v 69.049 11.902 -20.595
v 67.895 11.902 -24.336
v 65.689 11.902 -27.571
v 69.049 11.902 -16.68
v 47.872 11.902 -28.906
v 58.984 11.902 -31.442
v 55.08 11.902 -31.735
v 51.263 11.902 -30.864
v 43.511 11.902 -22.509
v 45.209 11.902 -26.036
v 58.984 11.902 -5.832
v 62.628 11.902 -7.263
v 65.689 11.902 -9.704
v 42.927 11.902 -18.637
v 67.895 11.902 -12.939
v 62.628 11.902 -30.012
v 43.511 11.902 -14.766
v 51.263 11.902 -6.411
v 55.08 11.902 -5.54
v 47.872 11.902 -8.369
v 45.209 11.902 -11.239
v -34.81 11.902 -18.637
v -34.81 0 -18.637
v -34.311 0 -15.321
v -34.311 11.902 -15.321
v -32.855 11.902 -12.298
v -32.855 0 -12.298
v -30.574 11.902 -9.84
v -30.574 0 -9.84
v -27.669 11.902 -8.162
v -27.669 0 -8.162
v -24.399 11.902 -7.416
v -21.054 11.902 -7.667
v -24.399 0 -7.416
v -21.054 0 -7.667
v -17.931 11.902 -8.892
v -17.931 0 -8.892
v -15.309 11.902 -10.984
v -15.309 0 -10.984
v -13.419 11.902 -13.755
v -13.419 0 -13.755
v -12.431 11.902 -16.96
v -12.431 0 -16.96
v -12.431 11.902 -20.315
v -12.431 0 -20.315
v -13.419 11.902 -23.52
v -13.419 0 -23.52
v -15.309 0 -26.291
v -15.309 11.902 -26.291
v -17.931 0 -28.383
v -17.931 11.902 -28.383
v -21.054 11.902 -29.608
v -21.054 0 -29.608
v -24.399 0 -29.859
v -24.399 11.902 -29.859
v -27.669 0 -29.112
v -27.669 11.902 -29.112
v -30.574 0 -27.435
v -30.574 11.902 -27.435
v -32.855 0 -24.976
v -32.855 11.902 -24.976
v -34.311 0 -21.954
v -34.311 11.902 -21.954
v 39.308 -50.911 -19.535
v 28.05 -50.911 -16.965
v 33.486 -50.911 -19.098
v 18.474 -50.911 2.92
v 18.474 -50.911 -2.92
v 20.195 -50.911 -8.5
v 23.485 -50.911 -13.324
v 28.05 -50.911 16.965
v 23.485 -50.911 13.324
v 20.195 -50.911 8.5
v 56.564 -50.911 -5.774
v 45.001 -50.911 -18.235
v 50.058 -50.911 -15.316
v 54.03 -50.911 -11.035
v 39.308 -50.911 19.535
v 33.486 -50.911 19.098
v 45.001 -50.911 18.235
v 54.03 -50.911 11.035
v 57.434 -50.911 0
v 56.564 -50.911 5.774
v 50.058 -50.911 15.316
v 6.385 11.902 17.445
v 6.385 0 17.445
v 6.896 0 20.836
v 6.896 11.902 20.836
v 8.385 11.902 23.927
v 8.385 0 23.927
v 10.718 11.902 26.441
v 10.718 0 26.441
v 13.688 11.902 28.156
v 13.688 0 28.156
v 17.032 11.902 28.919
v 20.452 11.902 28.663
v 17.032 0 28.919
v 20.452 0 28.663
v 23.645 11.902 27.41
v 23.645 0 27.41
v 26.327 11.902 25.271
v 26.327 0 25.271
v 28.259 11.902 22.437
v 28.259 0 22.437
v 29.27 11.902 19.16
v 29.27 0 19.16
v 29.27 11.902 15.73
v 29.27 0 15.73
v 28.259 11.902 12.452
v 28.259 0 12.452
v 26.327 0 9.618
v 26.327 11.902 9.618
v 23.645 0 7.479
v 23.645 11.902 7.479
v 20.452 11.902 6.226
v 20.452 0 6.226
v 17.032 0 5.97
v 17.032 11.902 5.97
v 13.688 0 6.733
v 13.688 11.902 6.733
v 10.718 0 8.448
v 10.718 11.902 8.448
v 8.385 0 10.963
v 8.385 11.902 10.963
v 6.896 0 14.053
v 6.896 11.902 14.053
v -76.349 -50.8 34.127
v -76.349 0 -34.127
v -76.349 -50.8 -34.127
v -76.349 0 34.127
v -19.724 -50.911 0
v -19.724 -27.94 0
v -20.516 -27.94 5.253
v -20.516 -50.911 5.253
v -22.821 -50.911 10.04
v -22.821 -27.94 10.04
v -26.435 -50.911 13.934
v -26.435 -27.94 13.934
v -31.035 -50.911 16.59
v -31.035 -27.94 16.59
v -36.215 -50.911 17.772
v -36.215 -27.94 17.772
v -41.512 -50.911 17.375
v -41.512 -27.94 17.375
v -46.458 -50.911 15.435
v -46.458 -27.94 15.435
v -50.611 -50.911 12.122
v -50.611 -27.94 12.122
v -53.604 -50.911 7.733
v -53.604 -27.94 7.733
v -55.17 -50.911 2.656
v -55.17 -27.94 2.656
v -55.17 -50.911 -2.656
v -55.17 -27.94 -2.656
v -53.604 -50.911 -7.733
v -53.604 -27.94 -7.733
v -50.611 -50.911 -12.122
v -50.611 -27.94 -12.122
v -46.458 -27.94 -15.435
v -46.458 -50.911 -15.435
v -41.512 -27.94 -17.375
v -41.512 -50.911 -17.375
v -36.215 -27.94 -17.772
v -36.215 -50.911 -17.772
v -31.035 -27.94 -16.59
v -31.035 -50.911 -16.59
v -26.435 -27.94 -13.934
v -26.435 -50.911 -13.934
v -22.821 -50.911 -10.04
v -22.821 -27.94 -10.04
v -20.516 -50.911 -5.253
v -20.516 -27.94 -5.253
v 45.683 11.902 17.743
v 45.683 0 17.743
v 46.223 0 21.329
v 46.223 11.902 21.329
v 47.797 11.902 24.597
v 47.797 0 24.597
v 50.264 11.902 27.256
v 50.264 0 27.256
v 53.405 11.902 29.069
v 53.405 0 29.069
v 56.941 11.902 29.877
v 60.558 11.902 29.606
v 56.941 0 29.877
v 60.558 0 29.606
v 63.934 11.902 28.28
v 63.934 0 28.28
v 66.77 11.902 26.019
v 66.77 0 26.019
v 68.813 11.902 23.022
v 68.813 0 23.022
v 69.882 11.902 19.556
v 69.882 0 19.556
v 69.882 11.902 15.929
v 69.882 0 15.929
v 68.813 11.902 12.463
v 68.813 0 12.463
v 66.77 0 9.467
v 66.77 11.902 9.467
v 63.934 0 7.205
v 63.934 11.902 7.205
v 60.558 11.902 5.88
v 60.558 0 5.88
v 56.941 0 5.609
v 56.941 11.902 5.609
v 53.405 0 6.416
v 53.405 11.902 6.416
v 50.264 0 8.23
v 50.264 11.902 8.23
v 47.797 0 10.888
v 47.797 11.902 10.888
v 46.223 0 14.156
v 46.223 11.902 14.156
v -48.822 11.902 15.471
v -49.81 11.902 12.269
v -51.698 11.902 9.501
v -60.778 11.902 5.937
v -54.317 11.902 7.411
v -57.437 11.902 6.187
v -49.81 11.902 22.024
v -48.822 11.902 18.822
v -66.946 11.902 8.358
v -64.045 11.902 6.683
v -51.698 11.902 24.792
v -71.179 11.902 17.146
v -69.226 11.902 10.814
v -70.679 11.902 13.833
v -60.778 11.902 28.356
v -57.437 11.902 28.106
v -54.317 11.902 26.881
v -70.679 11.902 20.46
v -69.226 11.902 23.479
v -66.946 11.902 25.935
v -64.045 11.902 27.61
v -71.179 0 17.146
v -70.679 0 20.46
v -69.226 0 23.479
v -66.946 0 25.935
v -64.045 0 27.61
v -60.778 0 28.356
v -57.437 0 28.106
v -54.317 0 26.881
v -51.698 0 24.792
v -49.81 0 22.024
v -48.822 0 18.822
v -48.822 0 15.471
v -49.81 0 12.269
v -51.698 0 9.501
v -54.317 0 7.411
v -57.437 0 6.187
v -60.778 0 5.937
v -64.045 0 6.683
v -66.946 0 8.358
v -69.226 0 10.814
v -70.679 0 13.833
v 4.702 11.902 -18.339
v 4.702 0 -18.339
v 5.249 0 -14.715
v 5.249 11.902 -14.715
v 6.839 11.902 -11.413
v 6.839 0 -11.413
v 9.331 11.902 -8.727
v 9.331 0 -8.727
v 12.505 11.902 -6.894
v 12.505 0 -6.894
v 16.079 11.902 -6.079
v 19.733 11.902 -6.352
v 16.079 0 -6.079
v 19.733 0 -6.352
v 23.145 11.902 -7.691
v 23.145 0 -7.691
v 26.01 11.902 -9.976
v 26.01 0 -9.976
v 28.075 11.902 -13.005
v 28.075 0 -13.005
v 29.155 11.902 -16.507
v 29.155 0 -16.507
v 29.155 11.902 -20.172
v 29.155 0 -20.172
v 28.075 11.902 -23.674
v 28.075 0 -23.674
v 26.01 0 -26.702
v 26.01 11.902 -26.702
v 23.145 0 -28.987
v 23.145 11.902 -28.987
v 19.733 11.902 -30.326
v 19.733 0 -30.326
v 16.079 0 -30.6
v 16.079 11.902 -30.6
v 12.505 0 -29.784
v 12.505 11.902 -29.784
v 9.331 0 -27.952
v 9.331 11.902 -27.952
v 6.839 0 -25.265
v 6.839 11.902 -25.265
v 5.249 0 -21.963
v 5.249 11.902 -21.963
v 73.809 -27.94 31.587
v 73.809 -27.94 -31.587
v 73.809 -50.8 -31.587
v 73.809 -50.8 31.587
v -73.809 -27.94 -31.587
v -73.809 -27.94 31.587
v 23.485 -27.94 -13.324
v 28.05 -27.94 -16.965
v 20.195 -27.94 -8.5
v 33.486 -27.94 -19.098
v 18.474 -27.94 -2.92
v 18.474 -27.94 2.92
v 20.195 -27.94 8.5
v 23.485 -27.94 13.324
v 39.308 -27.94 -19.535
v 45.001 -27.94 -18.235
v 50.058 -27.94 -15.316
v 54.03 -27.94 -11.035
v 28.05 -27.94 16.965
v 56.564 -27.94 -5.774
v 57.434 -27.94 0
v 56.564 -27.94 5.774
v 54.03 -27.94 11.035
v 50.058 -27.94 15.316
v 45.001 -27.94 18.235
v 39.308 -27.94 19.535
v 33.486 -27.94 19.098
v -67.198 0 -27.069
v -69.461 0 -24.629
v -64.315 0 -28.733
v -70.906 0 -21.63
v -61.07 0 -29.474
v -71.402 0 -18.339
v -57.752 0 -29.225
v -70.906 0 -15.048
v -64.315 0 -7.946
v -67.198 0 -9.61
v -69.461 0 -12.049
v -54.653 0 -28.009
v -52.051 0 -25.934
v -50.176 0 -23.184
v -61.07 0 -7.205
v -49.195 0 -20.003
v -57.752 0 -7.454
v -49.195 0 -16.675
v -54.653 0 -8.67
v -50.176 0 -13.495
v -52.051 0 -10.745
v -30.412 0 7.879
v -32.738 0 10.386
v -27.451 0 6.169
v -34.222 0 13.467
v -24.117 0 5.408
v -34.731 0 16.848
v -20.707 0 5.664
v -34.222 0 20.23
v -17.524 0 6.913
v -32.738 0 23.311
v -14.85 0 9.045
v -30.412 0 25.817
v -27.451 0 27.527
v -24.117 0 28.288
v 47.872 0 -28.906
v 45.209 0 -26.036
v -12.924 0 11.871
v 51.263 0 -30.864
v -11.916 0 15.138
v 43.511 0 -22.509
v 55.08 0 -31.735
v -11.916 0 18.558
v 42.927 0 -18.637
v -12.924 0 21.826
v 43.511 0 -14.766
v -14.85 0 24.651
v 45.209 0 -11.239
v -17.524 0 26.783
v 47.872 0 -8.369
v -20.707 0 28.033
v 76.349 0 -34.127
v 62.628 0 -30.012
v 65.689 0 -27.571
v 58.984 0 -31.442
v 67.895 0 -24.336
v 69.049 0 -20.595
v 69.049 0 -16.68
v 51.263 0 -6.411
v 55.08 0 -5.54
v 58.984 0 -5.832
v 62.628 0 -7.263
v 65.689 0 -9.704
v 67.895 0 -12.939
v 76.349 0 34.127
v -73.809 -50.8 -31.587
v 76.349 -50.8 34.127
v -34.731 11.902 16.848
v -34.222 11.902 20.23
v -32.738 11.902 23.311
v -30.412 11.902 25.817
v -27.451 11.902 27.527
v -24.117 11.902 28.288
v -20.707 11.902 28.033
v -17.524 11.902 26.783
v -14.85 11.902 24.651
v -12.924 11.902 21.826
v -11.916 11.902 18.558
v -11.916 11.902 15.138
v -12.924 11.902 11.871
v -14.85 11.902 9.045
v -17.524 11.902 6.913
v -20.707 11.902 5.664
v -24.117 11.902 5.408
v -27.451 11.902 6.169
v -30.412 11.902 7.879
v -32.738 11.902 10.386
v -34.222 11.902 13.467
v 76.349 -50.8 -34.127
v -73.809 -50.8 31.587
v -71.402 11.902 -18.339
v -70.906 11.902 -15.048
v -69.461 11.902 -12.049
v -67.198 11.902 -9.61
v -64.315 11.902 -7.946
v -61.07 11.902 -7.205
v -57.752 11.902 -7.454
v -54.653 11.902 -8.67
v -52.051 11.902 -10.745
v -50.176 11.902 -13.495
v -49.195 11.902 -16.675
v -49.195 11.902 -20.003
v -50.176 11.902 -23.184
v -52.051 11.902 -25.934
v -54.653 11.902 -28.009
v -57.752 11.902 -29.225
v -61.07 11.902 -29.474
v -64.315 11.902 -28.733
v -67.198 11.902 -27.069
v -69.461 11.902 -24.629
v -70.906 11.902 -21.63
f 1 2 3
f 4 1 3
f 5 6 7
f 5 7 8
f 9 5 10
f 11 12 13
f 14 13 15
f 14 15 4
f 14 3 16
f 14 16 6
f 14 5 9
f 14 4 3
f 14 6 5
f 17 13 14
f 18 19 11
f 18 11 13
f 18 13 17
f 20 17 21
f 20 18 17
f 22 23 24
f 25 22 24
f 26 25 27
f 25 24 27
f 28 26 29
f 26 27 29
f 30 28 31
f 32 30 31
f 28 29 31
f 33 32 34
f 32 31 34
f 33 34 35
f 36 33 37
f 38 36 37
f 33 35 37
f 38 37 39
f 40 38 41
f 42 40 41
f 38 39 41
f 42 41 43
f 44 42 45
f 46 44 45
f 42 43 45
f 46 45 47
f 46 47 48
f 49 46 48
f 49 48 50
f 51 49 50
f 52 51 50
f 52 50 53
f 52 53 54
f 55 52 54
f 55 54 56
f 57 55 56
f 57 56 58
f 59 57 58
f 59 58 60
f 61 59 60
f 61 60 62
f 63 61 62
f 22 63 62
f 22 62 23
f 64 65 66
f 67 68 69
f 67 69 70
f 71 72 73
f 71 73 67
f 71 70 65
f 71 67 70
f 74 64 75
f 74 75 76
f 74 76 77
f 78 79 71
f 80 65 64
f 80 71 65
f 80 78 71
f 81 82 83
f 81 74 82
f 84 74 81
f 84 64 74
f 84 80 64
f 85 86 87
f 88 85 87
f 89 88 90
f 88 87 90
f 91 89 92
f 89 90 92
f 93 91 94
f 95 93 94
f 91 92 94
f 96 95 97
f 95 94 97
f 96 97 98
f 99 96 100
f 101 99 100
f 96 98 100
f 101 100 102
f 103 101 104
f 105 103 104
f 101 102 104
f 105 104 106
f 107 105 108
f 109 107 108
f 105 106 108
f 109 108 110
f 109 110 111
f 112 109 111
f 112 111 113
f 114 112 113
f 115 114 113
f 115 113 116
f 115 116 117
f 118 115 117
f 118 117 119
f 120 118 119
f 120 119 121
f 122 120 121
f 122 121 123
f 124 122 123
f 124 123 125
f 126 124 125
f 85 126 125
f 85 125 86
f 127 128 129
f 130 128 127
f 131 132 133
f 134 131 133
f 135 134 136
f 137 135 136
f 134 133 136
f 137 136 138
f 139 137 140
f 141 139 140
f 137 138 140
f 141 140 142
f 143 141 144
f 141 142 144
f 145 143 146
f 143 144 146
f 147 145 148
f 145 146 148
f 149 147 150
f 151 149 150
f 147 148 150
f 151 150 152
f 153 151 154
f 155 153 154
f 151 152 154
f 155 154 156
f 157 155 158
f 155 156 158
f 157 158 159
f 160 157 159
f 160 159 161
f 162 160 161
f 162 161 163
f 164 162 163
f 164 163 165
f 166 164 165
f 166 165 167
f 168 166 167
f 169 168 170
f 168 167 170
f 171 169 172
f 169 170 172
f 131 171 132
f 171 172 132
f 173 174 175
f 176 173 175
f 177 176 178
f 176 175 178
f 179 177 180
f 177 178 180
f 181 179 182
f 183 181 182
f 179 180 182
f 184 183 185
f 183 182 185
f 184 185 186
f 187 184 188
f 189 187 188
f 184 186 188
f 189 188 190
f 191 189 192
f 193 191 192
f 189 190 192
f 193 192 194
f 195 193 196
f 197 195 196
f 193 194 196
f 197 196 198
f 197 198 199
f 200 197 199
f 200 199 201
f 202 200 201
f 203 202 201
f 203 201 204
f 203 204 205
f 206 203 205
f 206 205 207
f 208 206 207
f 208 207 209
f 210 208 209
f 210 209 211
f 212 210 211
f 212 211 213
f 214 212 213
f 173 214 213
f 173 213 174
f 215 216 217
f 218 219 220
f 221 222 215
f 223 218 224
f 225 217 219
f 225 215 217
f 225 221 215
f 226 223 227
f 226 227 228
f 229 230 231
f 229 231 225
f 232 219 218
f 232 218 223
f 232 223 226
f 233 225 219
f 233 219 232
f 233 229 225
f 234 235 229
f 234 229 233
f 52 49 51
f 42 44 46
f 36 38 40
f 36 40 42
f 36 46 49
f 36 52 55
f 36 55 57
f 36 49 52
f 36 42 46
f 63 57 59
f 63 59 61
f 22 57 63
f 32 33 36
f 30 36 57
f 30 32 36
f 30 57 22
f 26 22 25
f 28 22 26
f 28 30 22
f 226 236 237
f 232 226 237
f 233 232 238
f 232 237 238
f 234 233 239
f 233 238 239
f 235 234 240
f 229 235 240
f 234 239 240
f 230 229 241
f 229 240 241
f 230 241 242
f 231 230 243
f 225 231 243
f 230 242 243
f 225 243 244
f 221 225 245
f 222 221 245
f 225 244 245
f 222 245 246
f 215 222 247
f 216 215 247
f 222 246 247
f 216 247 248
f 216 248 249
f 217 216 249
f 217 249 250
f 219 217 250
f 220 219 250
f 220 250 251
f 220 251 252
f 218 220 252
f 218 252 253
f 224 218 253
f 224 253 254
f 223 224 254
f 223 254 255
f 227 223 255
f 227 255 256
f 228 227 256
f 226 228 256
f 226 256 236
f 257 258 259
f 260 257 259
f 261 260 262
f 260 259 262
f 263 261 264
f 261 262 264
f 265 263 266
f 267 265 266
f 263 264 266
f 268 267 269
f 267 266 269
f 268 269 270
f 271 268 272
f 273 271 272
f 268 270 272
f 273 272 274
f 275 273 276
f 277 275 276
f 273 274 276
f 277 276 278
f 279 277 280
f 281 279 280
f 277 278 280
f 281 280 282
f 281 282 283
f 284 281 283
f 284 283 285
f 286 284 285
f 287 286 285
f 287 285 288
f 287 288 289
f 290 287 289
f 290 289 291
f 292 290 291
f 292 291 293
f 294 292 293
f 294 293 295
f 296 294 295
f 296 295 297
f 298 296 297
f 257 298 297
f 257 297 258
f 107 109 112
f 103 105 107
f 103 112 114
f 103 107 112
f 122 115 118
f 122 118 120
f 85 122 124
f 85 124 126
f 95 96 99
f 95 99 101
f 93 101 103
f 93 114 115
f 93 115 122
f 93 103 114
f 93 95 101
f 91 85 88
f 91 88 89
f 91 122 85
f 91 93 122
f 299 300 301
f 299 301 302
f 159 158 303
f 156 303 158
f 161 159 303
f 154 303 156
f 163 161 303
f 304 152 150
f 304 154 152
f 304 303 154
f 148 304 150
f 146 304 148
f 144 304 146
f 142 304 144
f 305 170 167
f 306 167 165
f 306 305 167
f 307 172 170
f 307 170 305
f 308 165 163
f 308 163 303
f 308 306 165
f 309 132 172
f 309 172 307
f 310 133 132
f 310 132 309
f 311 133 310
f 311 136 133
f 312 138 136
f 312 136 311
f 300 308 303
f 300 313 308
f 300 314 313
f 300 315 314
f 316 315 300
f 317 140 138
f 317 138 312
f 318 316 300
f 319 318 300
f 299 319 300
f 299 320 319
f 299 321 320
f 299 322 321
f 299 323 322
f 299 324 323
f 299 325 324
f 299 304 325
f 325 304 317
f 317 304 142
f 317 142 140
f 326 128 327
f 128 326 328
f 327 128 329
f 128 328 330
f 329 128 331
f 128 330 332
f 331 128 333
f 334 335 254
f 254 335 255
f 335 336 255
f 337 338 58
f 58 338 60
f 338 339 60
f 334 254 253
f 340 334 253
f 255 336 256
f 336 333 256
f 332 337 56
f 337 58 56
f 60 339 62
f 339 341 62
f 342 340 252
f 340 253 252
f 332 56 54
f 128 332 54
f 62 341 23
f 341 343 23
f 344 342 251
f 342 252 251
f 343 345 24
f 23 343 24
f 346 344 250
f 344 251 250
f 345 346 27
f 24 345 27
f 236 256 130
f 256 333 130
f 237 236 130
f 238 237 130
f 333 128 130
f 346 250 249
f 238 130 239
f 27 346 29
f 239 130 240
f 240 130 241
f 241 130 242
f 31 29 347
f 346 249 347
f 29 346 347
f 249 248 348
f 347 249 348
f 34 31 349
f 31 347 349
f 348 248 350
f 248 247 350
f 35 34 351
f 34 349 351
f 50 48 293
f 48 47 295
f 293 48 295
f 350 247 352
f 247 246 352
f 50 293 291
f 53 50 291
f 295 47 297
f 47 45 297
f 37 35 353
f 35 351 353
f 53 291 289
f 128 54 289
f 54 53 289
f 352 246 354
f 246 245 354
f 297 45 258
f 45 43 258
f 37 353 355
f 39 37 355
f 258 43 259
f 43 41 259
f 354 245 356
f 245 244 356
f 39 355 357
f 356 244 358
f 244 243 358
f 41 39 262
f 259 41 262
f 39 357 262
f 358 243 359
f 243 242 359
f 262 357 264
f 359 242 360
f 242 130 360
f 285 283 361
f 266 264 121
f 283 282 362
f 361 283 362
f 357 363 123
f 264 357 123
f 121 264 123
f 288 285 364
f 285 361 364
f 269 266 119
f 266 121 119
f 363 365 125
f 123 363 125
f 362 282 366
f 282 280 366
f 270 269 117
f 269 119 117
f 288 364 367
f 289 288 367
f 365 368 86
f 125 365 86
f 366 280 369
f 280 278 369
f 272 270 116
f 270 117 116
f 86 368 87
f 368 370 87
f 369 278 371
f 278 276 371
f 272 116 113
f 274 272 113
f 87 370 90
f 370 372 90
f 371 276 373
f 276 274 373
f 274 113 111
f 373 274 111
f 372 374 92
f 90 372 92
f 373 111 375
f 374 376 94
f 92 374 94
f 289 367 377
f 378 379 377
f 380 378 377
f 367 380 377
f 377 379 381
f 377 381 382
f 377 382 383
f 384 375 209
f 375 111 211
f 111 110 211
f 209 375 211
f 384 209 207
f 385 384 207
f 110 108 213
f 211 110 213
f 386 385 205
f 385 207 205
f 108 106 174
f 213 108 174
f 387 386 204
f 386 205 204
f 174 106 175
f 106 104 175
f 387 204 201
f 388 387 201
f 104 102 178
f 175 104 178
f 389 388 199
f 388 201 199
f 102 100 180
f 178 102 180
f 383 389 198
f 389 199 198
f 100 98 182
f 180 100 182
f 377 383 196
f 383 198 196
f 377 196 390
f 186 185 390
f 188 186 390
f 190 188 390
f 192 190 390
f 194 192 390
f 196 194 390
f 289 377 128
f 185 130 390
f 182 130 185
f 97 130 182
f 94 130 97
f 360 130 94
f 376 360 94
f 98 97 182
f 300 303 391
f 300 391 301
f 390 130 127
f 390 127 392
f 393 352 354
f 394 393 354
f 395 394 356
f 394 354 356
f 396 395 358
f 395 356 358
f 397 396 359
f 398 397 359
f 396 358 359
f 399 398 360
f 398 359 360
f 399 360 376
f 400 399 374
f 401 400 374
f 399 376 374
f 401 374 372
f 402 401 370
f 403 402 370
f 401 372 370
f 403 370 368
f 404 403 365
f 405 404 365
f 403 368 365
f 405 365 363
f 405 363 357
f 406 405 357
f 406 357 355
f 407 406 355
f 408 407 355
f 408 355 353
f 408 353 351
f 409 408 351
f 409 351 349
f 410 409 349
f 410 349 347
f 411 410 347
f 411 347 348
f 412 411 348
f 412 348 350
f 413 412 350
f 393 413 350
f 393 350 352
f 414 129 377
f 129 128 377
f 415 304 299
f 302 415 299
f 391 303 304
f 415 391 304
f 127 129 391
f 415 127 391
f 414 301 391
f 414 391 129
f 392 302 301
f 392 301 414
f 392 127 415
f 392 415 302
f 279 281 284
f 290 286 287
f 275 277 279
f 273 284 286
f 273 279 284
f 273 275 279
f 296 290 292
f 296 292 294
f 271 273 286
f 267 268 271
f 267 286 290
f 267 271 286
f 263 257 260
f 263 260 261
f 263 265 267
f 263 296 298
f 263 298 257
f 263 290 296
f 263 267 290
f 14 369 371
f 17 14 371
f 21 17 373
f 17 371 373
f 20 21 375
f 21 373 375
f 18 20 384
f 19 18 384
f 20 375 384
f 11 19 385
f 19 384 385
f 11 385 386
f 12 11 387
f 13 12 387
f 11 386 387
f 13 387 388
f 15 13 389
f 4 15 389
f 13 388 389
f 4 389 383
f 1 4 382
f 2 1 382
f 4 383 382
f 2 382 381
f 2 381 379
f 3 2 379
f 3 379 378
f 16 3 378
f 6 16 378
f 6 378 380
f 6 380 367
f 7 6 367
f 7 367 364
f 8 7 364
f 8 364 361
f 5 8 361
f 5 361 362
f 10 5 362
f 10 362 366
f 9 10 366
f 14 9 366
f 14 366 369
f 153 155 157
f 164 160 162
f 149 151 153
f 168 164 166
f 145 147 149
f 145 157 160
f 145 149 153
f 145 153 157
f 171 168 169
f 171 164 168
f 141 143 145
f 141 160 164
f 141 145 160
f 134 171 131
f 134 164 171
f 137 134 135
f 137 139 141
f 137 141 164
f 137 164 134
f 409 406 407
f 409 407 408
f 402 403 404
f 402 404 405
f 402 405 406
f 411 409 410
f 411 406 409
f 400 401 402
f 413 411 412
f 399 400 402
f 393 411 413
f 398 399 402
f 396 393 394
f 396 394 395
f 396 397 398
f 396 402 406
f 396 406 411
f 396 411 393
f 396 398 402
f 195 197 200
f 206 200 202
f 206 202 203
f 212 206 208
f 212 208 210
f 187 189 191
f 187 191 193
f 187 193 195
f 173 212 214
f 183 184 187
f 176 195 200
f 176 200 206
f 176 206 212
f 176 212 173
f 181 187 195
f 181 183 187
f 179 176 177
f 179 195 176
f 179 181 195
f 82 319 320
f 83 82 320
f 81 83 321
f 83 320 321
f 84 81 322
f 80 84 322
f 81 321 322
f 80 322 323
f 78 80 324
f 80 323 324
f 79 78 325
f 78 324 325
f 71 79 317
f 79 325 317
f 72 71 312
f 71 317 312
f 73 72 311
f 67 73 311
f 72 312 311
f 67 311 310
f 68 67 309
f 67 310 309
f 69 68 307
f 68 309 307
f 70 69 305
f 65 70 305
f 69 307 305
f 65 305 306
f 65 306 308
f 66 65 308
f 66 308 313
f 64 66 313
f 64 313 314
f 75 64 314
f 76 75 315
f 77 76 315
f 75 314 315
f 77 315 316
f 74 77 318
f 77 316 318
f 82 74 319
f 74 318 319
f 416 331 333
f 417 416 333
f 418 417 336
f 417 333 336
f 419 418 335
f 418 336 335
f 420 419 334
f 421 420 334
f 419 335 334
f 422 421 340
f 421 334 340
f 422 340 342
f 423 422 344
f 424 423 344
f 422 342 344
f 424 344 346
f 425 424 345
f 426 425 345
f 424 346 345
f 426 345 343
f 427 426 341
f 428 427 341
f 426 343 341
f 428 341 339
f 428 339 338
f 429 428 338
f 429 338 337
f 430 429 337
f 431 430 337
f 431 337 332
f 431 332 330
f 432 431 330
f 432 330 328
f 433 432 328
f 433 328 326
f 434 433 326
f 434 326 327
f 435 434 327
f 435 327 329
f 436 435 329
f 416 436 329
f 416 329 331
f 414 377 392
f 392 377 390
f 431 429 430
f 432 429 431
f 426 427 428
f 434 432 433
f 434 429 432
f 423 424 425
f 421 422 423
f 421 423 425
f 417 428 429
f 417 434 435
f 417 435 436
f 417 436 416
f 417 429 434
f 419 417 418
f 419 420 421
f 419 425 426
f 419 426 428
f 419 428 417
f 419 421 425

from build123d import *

# Parameters (mm, degrees)
F0_W     = 152.6974141598
F0_H     = 68.2531446218
F1_DEPTH = 25.4
F2_DEPTH = 25.4
F3_T     = -2.54
F4_DEPTH = 25.4
F5_R     = 11.1655265509
F5_R_2   = 11.2527895093
F5_R_3   = 12.2950319863
F5_R_4   = 13.1342738177
F5_R_5   = 12.1678107689
F5_R_6   = 11.5067470657
F5_R_7   = 11.4719197335
F5_R_8   = 11.2409300987
F6_DEPTH = 11.901790014
F7_DEPTH = 9.59548
F8_R     = 17.8222476658
F8_R_2   = 19.5893706017
F9_DEPTH = 22.97085


with BuildPart() as f1:
    # F0 (on Front) → F1 (new body)
    with BuildSketch(Plane.XZ):
        Rectangle(F0_W, F0_H)
    extrude(amount=F1_DEPTH)

    # F2 (add): a face of the model
    f2_faces = [f1.faces().sort_by_distance(p)[0] for p in [
        (0, -25.4, 0),
    ]]
    extrude(f2_faces, amount=F2_DEPTH)

    # F3
    f3_openings = [f1.faces().sort_by_distance(p)[0] for p in [
        (0, -50.8, 0),
    ]]
    offset(amount=F3_T, openings=f3_openings)

    # F4 (add): a face of the model
    f4_faces = [f1.faces().sort_by_distance(p)[0] for p in [
        (0, -2.54, 0),
    ]]
    extrude(f4_faces, amount=F4_DEPTH)

    # F5 (on face) → F6 (join)
    with BuildSketch(Plane(origin=(0, 0, 0), x_dir=(-1, 0, 0), z_dir=(0, 1, 0))):
        with Locations((60.2360665798, -18.3391999453)):
            Circle(F5_R)
        with Locations((23.5576685518, -18.6373982579)):
            Circle(F5_R_2)
        with Locations((-16.9973094016, -18.3391999453)):
            Circle(F5_R_3)
        with Locations((-56.0612902045, -18.6373982579)):
            Circle(F5_R_4)
        with Locations((-57.8504800797, 17.7428014576)):
            Circle(F5_R_5)
        with Locations((-17.8919043392, 17.4446031451)):
            Circle(F5_R_6)
        with Locations((23.2594702393, 16.8482083827)):
            Circle(F5_R_7)
        with Locations((59.9378682673, 17.1464048326)):
            Circle(F5_R_8)
    extrude(amount=F6_DEPTH)

    # F5 (on face) → F7 (join)
    with BuildSketch(Plane(origin=(0, 0, 0), x_dir=(-1, 0, 0), z_dir=(0, 1, 0))):
        with Locations((60.2360665798, -18.3391999453)):
            Circle(F5_R)
        with Locations((23.5576685518, -18.6373982579)):
            Circle(F5_R_2)
        with Locations((59.9378682673, 17.1464048326)):
            Circle(F5_R_8)
        with Locations((23.2594702393, 16.8482083827)):
            Circle(F5_R_7)
        with Locations((-16.9973094016, -18.3391999453)):
            Circle(F5_R_3)
        with Locations((-56.0612902045, -18.6373982579)):
            Circle(F5_R_4)
        with Locations((-17.8919043392, 17.4446031451)):
            Circle(F5_R_6)
        with Locations((-57.8504800797, 17.7428014576)):
            Circle(F5_R_5)
    extrude(amount=F7_DEPTH)

    # F8 (on face) → F9 (join)
    with BuildSketch(Plane.XZ.offset(27.94)):
        with Locations((-37.5465936959, 0)):
            Circle(F8_R)
        with Locations((37.8445833921, 0)):
            Circle(F8_R_2)
    extrude(amount=F9_DEPTH)


solid = f1.part
